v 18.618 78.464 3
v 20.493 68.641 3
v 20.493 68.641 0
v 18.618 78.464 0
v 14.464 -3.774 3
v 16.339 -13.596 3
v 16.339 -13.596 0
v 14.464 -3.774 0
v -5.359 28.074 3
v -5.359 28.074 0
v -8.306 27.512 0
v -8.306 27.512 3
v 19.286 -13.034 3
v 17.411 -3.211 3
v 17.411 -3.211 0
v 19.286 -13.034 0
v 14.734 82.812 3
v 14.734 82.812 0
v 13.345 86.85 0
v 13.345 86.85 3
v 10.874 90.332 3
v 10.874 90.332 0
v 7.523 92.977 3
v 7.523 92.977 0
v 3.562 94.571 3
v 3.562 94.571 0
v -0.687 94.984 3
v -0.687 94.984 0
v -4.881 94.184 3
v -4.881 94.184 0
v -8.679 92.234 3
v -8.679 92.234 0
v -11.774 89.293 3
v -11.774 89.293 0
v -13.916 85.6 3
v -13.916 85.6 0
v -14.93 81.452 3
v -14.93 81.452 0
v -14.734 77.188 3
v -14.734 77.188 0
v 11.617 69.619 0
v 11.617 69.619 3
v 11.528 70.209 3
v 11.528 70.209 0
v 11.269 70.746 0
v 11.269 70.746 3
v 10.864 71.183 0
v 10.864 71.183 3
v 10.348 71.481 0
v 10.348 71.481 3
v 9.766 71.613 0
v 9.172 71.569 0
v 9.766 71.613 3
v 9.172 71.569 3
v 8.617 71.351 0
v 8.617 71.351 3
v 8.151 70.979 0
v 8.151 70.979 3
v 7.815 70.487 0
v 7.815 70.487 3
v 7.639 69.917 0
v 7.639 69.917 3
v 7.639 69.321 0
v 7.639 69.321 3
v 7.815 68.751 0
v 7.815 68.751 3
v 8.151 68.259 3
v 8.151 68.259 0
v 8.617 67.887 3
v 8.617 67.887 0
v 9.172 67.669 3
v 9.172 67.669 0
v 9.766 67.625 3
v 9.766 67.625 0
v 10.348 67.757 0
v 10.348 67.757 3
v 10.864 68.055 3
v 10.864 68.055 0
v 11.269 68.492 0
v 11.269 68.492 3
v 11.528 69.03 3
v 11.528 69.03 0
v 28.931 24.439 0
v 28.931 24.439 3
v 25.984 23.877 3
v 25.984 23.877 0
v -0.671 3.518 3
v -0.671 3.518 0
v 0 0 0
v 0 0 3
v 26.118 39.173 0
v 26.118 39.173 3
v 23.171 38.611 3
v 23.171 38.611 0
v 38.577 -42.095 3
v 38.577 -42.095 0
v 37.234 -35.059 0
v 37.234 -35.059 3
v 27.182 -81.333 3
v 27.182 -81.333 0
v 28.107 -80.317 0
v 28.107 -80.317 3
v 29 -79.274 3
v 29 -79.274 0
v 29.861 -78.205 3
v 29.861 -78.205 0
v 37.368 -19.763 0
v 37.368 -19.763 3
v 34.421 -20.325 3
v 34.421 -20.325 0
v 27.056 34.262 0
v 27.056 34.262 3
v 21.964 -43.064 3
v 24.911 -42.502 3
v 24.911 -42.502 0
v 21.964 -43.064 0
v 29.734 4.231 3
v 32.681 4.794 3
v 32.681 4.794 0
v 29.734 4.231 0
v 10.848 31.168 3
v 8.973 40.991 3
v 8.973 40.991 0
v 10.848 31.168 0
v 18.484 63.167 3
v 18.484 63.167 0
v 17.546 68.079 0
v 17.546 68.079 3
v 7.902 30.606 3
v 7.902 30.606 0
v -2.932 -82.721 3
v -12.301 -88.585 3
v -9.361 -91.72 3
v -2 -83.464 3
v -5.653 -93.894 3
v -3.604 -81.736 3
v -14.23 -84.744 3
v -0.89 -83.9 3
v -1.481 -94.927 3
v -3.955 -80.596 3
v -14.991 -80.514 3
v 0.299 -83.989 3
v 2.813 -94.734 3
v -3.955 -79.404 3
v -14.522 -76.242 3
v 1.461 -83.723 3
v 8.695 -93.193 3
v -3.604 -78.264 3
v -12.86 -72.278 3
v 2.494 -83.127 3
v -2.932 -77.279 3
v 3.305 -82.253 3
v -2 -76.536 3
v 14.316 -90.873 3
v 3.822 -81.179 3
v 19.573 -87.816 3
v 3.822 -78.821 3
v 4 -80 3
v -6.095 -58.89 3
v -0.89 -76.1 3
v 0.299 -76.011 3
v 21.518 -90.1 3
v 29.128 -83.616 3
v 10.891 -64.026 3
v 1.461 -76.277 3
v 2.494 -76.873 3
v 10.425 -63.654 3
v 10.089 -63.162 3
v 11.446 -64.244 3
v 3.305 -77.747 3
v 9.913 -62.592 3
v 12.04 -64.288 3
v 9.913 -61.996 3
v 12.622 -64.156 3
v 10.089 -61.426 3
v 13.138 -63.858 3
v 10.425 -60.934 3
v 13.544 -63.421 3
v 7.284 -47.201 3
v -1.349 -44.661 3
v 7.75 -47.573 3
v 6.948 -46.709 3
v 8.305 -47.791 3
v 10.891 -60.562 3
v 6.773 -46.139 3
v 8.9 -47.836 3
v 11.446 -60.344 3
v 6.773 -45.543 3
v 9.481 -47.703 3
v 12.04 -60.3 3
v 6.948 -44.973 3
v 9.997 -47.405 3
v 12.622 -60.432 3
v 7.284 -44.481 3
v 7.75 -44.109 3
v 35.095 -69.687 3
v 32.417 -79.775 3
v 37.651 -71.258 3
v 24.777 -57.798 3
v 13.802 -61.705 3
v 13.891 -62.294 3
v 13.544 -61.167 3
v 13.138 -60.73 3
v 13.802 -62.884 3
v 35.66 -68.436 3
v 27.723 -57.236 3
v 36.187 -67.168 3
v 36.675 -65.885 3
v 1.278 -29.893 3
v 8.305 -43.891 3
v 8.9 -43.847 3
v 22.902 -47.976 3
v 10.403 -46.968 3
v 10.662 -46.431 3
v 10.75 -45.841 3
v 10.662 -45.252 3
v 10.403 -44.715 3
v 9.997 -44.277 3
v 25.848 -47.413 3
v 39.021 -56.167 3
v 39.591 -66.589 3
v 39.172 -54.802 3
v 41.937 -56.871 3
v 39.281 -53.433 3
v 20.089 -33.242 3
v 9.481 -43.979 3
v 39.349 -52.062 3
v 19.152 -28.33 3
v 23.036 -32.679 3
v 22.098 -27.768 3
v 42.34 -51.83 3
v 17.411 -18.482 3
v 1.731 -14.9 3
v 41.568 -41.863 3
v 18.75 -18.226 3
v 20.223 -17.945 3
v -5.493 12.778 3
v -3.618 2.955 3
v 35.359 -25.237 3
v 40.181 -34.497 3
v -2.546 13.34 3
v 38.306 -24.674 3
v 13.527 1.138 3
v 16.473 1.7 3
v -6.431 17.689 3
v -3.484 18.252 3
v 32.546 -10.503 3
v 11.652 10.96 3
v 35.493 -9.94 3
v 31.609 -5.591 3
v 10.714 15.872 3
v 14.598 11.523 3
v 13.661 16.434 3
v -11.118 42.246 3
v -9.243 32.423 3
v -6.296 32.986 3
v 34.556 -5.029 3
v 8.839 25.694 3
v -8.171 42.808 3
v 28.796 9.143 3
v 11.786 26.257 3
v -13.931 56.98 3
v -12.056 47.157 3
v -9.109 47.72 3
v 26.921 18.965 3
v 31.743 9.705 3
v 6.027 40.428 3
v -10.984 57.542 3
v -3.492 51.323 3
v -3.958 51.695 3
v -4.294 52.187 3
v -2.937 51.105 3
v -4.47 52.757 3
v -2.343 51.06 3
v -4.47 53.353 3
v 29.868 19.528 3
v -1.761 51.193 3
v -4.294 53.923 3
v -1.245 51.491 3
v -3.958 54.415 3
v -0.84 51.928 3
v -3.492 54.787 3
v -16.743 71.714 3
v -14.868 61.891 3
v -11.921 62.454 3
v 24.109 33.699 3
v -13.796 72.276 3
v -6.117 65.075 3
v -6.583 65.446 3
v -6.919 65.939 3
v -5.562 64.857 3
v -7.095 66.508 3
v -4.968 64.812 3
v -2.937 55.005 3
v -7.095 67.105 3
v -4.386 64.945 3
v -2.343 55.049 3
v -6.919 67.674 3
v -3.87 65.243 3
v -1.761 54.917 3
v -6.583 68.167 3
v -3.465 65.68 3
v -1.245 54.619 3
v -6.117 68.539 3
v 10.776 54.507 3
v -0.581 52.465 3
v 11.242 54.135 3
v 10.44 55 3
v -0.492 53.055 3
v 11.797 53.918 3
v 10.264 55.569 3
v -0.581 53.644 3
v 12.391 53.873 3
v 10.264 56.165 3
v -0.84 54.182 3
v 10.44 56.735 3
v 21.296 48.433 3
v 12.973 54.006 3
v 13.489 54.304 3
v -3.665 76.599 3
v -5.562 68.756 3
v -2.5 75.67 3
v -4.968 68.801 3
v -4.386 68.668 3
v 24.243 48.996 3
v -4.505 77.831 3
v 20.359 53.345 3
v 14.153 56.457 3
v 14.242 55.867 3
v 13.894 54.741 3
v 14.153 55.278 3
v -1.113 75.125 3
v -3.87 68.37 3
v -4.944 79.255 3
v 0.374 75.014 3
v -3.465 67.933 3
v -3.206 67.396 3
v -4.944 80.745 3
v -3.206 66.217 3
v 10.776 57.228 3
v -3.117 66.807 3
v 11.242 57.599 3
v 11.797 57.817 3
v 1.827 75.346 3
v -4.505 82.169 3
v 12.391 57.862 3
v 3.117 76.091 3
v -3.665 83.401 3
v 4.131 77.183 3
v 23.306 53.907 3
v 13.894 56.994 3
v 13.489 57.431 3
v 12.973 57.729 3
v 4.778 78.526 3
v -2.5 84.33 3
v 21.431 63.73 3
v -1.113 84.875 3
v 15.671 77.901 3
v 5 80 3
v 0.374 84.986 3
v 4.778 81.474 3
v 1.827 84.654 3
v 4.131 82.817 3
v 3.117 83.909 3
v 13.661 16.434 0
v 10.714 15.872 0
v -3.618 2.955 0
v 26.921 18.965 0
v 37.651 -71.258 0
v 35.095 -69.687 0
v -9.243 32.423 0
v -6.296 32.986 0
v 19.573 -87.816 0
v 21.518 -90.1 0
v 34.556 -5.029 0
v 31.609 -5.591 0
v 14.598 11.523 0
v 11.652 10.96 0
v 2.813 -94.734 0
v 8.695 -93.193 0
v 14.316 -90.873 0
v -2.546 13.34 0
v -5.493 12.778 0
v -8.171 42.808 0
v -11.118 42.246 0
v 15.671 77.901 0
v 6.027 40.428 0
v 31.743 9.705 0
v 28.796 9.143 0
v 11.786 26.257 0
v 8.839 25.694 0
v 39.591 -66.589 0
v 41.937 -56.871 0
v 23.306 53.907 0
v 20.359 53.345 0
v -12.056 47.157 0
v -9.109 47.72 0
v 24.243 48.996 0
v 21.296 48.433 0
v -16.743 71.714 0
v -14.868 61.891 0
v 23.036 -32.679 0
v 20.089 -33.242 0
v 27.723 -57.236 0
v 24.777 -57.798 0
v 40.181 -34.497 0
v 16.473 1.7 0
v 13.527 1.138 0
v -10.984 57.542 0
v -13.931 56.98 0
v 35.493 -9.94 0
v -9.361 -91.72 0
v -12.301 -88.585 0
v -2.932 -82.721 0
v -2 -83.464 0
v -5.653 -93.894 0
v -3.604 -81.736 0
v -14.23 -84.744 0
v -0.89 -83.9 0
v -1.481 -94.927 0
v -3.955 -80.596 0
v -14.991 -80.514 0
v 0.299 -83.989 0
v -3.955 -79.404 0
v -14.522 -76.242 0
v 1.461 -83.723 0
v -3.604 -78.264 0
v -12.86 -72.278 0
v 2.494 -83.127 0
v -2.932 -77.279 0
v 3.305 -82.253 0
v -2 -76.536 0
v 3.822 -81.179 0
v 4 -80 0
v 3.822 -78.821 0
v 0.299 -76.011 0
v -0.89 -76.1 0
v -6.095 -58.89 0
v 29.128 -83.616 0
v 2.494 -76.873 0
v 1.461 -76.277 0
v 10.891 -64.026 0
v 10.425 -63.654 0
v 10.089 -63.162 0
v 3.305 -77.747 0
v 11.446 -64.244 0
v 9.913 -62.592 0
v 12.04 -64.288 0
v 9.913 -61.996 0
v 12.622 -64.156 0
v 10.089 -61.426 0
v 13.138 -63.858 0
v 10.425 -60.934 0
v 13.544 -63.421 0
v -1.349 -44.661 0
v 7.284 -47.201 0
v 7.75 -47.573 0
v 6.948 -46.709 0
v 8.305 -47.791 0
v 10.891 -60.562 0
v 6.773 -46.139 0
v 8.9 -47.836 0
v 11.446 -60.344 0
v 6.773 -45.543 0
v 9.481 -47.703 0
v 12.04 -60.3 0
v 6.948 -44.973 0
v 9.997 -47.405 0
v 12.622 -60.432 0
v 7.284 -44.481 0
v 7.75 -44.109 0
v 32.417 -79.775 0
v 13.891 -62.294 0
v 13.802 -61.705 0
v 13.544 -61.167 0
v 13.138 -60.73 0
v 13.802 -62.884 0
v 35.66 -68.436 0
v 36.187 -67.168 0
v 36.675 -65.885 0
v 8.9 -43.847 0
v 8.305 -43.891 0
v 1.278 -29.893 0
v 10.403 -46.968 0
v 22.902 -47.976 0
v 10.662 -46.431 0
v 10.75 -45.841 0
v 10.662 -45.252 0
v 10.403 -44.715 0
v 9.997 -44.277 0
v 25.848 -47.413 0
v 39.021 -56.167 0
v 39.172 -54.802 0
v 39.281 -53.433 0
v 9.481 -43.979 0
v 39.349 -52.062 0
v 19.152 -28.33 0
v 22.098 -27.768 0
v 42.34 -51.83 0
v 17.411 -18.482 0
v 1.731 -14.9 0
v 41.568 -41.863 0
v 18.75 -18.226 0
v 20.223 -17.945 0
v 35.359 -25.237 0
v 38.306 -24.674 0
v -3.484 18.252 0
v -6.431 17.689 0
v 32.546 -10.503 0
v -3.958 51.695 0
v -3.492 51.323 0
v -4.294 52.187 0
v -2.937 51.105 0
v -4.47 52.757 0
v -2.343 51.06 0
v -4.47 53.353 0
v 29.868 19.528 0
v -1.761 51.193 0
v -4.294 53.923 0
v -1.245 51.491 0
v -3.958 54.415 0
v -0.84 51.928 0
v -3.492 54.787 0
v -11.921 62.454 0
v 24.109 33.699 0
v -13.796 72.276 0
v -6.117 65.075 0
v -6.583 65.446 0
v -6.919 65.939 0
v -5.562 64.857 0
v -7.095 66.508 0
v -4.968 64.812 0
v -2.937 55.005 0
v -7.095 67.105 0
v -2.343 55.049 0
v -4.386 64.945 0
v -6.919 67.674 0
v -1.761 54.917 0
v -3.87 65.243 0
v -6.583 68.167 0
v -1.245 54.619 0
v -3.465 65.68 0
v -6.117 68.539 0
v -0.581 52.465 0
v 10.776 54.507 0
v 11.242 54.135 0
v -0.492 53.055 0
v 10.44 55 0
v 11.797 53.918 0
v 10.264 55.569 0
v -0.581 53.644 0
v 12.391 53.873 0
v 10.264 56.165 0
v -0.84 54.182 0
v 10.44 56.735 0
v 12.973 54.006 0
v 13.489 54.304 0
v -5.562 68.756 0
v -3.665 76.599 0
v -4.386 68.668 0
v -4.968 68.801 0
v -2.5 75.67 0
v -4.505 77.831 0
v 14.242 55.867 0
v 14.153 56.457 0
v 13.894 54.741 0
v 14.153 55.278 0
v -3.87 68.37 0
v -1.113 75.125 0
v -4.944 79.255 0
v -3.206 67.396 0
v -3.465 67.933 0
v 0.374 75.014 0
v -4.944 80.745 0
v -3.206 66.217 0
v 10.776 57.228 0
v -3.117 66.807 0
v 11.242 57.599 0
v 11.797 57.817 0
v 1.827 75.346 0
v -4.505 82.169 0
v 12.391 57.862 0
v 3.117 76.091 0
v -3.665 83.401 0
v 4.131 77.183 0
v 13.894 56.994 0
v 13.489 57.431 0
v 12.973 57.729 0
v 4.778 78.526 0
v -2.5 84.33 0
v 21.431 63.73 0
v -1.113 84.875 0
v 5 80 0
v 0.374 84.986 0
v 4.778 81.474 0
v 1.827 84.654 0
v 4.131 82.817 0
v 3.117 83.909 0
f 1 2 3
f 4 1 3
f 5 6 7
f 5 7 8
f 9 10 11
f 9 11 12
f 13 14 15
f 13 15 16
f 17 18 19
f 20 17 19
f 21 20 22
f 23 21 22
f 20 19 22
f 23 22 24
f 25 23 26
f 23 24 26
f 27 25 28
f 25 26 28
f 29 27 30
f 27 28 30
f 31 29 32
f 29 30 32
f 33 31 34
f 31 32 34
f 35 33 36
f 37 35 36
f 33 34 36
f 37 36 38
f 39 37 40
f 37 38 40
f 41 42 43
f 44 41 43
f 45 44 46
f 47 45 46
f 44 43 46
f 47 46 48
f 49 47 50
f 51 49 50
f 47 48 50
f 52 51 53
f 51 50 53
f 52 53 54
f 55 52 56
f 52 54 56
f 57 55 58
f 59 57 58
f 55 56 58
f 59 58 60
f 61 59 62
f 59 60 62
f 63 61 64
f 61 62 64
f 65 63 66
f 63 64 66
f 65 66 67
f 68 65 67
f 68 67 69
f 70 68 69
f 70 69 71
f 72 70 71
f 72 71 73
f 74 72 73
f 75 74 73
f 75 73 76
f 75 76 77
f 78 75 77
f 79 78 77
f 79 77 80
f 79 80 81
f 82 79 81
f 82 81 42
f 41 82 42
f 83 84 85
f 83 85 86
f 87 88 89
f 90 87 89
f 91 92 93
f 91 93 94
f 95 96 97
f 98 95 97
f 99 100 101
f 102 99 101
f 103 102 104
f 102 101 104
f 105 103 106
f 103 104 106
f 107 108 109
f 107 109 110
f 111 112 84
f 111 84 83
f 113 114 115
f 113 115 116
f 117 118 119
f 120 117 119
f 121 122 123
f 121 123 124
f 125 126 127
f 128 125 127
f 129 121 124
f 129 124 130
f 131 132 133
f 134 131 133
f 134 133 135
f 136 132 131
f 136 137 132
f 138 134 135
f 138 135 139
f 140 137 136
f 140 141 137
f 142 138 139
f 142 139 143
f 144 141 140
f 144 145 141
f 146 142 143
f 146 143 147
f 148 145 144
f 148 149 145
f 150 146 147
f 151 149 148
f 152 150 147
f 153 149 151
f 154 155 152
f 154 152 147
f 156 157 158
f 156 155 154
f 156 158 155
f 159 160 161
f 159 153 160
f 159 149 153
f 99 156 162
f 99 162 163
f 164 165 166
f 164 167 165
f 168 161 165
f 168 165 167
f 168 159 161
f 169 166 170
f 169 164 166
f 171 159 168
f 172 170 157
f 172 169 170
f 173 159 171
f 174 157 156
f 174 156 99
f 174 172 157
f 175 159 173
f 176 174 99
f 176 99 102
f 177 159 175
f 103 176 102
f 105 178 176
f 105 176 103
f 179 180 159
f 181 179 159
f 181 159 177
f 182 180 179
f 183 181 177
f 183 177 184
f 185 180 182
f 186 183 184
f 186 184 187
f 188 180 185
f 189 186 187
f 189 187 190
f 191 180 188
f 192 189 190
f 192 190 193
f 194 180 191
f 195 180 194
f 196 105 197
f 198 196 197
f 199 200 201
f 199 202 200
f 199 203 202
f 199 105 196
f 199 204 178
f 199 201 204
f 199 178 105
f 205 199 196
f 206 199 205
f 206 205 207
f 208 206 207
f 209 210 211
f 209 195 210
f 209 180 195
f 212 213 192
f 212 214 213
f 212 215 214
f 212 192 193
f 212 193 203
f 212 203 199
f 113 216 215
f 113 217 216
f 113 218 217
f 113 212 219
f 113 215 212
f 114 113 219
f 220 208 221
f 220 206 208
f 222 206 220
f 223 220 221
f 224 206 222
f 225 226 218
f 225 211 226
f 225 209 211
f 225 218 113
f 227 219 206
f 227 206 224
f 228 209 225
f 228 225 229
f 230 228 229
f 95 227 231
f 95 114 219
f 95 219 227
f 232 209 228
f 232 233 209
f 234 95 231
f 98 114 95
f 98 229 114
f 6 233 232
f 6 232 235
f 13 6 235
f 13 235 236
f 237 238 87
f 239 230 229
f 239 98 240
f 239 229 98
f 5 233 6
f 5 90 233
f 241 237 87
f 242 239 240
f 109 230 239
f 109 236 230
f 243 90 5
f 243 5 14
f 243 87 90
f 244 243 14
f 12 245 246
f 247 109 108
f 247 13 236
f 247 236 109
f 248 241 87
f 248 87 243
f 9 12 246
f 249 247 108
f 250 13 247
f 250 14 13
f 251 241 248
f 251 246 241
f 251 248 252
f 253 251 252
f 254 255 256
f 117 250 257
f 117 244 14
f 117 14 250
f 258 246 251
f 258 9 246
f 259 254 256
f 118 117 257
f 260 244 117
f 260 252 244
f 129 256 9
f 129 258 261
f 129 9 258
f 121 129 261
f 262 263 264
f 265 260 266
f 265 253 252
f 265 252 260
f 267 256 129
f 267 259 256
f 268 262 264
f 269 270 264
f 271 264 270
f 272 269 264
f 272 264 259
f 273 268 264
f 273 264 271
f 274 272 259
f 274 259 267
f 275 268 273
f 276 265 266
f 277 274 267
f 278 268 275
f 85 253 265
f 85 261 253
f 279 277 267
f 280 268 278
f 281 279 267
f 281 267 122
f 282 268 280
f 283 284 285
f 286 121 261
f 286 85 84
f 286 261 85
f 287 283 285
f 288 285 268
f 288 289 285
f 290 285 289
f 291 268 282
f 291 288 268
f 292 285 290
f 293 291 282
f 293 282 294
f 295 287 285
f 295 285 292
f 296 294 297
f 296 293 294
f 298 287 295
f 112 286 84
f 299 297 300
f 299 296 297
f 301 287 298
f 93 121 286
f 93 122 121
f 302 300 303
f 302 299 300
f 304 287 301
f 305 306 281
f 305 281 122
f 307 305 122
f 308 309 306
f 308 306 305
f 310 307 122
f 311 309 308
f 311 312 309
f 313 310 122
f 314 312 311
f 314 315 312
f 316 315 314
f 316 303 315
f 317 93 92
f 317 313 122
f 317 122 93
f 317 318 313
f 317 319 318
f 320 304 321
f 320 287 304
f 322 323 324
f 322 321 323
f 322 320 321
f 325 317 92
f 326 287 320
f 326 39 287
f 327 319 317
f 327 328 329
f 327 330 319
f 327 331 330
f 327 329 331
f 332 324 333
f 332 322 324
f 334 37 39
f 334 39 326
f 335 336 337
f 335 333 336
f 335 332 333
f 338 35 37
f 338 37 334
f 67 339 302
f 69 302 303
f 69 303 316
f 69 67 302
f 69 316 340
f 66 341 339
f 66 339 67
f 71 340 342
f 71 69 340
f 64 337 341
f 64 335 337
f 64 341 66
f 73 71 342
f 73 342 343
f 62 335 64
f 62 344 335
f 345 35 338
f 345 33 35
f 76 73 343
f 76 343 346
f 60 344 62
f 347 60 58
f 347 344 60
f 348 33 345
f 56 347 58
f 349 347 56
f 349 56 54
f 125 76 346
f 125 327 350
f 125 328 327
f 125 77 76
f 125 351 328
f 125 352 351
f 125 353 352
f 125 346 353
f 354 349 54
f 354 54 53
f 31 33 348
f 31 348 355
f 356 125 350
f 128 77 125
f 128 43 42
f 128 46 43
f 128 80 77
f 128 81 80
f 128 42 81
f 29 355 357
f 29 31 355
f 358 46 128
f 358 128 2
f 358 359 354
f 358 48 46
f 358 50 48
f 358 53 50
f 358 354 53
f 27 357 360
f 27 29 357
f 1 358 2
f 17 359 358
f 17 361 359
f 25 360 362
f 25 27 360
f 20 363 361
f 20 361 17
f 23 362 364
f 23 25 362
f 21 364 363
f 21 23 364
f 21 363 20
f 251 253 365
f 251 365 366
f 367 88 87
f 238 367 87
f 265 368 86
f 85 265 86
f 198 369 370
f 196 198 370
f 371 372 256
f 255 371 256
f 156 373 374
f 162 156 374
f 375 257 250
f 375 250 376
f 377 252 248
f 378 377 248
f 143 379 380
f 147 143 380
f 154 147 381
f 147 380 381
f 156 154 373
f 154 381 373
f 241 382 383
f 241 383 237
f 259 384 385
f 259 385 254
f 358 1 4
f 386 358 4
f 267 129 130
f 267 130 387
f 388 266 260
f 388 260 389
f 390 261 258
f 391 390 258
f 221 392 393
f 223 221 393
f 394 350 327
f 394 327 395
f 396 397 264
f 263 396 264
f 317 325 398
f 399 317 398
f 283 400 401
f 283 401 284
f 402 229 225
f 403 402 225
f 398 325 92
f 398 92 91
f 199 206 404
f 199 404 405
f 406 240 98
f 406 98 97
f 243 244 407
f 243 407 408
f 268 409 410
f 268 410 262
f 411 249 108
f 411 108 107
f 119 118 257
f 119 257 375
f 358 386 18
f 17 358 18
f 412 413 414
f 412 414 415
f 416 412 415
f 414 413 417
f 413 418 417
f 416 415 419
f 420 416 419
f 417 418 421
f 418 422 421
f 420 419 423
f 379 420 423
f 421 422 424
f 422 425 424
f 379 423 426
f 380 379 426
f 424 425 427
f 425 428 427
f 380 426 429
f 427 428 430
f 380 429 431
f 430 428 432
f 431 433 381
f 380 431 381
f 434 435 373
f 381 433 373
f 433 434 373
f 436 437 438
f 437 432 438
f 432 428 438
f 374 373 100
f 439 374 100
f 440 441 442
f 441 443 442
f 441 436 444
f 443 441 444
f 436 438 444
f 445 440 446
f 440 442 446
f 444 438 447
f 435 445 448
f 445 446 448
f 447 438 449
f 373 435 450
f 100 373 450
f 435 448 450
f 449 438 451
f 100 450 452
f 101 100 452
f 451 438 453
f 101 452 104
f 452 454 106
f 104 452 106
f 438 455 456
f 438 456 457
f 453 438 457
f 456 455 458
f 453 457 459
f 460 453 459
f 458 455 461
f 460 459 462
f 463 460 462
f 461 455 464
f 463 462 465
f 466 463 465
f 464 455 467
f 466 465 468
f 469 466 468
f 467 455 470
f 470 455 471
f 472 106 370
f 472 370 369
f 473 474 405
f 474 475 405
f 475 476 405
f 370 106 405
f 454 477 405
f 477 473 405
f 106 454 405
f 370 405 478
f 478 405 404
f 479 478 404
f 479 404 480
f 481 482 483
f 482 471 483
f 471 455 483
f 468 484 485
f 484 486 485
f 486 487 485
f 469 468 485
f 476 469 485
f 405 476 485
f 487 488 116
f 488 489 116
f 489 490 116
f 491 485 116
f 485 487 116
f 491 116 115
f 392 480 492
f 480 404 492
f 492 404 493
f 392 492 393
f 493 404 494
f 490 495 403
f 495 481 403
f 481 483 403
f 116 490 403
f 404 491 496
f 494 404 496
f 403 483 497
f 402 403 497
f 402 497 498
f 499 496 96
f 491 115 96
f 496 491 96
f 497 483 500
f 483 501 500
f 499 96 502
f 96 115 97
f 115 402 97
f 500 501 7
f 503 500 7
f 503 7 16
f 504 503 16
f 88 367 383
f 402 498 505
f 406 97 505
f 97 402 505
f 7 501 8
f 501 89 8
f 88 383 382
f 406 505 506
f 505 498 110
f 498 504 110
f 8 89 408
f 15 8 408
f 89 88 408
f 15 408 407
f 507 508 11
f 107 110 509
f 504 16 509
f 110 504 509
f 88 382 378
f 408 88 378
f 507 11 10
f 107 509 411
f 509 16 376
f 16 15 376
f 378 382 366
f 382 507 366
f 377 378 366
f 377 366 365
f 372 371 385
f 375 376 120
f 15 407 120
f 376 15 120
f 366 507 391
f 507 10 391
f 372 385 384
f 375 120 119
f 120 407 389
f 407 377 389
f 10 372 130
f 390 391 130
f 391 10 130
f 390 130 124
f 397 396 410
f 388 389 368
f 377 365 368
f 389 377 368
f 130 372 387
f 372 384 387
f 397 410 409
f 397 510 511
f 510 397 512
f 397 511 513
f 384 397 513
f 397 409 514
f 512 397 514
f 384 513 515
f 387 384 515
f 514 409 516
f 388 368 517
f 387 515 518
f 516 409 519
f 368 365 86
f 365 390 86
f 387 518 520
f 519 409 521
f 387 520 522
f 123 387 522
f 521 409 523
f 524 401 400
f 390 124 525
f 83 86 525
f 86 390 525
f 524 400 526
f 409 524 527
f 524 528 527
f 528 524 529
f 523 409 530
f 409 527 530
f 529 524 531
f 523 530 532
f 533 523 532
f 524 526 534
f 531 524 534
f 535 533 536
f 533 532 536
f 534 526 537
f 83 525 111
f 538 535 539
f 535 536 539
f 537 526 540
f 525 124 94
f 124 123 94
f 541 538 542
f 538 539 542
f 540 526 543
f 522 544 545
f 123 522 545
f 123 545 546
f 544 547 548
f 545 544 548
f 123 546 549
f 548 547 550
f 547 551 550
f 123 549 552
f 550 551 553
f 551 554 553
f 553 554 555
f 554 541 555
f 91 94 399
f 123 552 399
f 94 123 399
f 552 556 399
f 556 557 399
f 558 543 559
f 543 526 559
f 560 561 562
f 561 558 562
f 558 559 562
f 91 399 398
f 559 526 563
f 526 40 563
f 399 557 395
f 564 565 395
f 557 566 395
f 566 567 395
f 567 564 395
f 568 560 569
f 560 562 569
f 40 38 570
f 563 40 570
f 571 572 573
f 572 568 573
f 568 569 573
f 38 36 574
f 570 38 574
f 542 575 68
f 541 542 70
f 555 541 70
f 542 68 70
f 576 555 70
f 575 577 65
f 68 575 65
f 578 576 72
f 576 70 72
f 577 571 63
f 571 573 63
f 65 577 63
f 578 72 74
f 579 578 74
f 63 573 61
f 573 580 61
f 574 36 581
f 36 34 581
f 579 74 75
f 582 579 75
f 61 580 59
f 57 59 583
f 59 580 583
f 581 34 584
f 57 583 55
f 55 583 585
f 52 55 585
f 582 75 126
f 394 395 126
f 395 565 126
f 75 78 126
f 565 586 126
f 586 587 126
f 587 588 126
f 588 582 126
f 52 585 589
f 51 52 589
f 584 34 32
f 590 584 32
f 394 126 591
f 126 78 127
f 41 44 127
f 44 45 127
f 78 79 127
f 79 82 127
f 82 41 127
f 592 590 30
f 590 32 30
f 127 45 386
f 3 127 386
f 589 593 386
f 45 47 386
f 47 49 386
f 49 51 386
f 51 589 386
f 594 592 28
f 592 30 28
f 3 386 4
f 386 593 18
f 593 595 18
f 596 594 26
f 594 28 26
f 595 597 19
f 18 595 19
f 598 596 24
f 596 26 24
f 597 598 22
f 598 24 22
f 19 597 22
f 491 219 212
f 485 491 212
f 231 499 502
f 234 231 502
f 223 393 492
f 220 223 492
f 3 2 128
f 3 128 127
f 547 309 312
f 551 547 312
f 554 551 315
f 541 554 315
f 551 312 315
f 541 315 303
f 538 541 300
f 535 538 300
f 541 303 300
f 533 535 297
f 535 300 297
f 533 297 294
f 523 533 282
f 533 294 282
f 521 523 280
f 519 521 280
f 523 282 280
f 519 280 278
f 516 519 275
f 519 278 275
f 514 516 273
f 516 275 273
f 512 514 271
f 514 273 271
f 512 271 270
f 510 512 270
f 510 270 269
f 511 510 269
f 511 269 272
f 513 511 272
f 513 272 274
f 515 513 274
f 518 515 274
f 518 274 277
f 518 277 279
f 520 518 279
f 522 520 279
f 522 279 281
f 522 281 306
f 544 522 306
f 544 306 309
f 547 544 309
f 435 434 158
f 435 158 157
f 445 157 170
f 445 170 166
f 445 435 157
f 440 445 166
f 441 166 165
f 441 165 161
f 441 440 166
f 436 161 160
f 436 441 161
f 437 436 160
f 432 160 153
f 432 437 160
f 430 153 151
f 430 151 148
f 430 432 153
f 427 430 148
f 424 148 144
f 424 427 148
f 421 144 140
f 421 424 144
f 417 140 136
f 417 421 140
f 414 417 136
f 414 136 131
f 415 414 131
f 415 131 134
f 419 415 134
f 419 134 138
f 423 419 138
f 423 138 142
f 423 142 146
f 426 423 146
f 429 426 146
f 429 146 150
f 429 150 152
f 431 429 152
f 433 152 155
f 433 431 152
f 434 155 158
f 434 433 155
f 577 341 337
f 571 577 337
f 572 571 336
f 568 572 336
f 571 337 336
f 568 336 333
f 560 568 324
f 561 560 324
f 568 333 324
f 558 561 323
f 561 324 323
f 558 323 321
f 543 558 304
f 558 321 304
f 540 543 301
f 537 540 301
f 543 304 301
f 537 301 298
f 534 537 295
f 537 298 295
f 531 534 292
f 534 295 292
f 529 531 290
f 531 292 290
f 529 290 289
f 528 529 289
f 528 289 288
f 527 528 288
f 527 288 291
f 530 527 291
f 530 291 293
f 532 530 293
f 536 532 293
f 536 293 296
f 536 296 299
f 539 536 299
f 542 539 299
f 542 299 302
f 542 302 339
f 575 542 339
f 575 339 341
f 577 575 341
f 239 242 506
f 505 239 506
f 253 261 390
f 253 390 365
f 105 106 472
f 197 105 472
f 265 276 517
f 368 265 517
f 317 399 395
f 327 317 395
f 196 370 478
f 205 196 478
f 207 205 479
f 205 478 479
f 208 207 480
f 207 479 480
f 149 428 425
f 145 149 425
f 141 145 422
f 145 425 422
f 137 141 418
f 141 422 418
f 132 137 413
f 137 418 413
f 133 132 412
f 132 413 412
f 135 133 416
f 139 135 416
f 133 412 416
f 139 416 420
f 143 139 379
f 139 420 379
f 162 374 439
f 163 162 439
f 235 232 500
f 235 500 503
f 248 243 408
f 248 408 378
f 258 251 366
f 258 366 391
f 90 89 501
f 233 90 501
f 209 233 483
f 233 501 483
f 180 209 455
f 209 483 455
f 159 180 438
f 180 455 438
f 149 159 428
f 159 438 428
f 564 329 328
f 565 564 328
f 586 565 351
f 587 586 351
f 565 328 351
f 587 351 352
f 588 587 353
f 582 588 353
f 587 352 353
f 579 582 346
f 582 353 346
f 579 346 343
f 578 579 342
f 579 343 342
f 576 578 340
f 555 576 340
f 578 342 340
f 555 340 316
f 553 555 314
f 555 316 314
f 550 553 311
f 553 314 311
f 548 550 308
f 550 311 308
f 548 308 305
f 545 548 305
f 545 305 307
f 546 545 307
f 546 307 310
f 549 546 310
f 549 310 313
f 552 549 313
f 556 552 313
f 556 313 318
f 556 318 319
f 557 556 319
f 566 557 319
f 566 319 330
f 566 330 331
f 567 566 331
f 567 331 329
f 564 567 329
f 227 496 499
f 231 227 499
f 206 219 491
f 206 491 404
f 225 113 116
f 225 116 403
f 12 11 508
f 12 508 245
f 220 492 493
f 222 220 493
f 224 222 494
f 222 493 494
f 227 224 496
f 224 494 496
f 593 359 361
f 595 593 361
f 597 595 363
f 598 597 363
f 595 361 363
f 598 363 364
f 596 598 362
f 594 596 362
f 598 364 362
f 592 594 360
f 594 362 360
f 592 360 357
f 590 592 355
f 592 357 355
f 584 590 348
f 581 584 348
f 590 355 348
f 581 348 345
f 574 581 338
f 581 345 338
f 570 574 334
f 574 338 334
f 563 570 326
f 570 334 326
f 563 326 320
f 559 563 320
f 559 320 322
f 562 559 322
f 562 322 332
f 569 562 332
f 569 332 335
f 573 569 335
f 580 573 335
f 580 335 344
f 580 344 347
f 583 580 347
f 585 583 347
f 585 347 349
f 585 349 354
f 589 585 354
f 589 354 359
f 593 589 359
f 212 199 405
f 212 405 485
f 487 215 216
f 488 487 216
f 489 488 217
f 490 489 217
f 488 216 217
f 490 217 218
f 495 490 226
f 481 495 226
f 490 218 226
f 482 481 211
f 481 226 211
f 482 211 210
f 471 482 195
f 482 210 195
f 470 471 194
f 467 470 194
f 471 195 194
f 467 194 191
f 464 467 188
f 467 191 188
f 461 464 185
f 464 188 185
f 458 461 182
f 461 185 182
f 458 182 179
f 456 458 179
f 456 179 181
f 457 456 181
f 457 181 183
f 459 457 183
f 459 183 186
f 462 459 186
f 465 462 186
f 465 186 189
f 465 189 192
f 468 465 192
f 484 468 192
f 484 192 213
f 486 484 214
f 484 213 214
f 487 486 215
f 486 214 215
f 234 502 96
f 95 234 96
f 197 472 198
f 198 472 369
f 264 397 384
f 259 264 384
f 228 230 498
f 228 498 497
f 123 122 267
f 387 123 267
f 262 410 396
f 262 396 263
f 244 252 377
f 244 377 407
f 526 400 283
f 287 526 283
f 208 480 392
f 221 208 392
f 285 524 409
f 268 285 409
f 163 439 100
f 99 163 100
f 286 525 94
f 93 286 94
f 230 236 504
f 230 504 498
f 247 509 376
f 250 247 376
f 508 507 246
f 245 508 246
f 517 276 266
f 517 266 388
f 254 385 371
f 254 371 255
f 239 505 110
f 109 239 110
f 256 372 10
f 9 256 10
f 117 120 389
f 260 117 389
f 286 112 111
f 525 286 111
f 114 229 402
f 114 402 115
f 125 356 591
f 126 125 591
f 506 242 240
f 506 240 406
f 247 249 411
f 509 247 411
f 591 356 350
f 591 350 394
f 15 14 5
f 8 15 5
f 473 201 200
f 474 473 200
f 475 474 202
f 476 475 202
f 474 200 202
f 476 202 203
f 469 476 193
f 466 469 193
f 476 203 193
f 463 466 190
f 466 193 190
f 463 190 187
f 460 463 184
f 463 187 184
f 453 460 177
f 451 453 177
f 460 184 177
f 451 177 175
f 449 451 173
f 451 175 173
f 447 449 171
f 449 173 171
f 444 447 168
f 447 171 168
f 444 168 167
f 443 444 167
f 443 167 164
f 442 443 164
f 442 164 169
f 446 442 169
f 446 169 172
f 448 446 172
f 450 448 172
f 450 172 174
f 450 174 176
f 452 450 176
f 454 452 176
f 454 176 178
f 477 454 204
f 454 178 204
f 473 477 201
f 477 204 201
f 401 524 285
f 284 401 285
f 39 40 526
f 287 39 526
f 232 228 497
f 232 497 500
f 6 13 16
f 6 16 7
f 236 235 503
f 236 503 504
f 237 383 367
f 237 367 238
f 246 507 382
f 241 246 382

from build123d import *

# Parameters (mm, degrees)
SKETCH_1_R          = 4
EXTRUDE_1_DEPTH     = 3
SKETCH_3_W          = 3
SKETCH_3_H          = 10
EXTRUDE_2_DEPTH     = 3
EXTRUDE_START       = -3
EXTRUDE_3_DEPTH     = 3
SKETCH_6_W          = 3
SKETCH_6_H          = 10
EXTRUDE_4_DEPTH     = 3
SKETCH_9_R          = 2
CUT_EXTRUDE_1_DEPTH = 3
CUT_EXTRUDE_2_DEPTH = 3
SKETCH_11_R         = 2
CUT_EXTRUDE_3_DEPTH = 10
SKETCH_12_R         = 5
CUT_EXTRUDE_4_DEPTH = 10


with BuildPart() as part:
    # 草图1 → 凸台-拉伸1 (new body)
    with BuildSketch(Plane.XY):
        with BuildLine():
            Line((-14.733969043, 77.1875), (0, 0))
            ThreePointArc((0, 0), (0.234014868, -37.324654706), (-12.859683228, -72.278047703))
            ThreePointArc((-12.859683228, -72.278047703), (-12.300551756, -88.584662282), (2.8125, -94.733969043))
            ThreePointArc((2.8125, -94.733969043), (31.596681738, -75.82131672), (38.576907128, -42.094561915))
            Line((38.576907128, -42.094561915), (14.733969043, 82.8125))
            ThreePointArc((14.733969043, 82.8125), (-2.8125, 94.733969043), (-14.733969043, 77.1875))
        make_face()
        with Locations((0, 80)):
            Circle(SKETCH_1_R, mode=Mode.SUBTRACT)
        with Locations((0, -80)):
            Circle(SKETCH_1_R, mode=Mode.SUBTRACT)
    extrude(amount=EXTRUDE_1_DEPTH)

    # 草图3 → 凸台-拉伸2 (add)
    with BuildSketch(Plane(origin=(29.467938085, 5.625, 0), x_dir=(0, 0, -1), z_dir=(0.9822646028438571, 0.18749999999999992, 0))):
        with Locations((-1.5, 68.581168228)):
            Rectangle(SKETCH_3_W, SKETCH_3_H)
        with Locations((-1.5, 53.581168228)):
            Rectangle(SKETCH_3_W, SKETCH_3_H)
        with Locations((-1.5, 38.581168228)):
            Rectangle(SKETCH_3_W, SKETCH_3_H)
        with Locations((-1.5, 23.581168228)):
            Rectangle(SKETCH_3_W, SKETCH_3_H)
        with Locations((-1.5, 8.581168228)):
            Rectangle(SKETCH_3_W, SKETCH_3_H)
        with Locations((-1.5, -6.418831772)):
            Rectangle(SKETCH_3_W, SKETCH_3_H)
        with Locations((-1.5, -21.418831772)):
            Rectangle(SKETCH_3_W, SKETCH_3_H)
        with Locations((-1.5, -36.418831772)):
            Rectangle(SKETCH_3_W, SKETCH_3_H)
    extrude(amount=EXTRUDE_2_DEPTH)

    # 草图5 → 凸台-拉伸3 (add)
    with BuildSketch(Plane.XY.offset(3).offset(EXTRUDE_START)):
        with BuildLine():
            Line((41.937087865, -56.870590681), (39.020842697, -56.166663045))
            ThreePointArc((39.020842697, -56.166663045), (38.118677527, -61.090976463), (36.675111125, -65.884605639))
            Line((36.675111125, -65.884605639), (39.591356294, -66.588533275))
            Line((39.591356294, -66.588533275), (41.937087865, -56.870590681))
        make_face()
        with BuildLine():
            ThreePointArc((36.675111125, -65.884605639), (38.118677527, -61.090976463), (39.020842697, -56.166663045))
            Line((39.020842697, -56.166663045), (31.045751878, -56.518626863))
            Line((31.045751878, -56.518626863), (36.675111125, -65.884605639))
        make_face()
        with BuildLine():
            Line((35.852417991, -52.061745464), (39.348993243, -52.061745464))
            ThreePointArc((39.348993243, -52.061745464), (39.240593596, -47.056646648), (38.576907128, -42.094561915))
            Line((38.576907128, -42.094561915), (35.852417991, -52.061745464))
        make_face()
        with BuildLine():
            ThreePointArc((38.576907128, -42.094561915), (39.240593596, -47.056646648), (39.348993243, -52.061745464))
            Line((39.348993243, -52.061745464), (42.340032816, -51.830051112))
            Line((42.340032816, -51.830051112), (41.567946701, -41.862867564))
            Line((41.567946701, -41.862867564), (38.576907128, -42.094561915))
        make_face()
        with BuildLine():
            ThreePointArc((29.860599408, -78.204651867), (32.714825521, -74.091726153), (35.094532117, -69.687210158))
            Line((35.094532117, -69.687210158), (30.758010447, -62.472220292))
            Line((30.758010447, -62.472220292), (29.860599408, -78.204651867))
        make_face()
        with BuildLine():
            Line((37.650520485, -71.25785444), (35.094532117, -69.687210158))
            ThreePointArc((35.094532117, -69.687210158), (32.714825521, -74.091726153), (29.860599408, -78.204651867))
            Line((29.860599408, -78.204651867), (32.416587776, -79.775296149))
            Line((32.416587776, -79.775296149), (37.650520485, -71.25785444))
        make_face()
        with BuildLine():
            ThreePointArc((19.572509978, -87.815912184), (23.558004264, -84.786291758), (27.182310023, -81.332717899))
            Line((27.182310023, -81.332717899), (19.572509978, -65.497664614))
            Line((19.572509978, -65.497664614), (19.572509978, -87.815912184))
        make_face()
        with BuildLine():
            Line((29.127843641, -83.616333222), (27.182310023, -81.332717899))
            ThreePointArc((27.182310023, -81.332717899), (23.558004264, -84.786291758), (19.572509978, -87.815912184))
            Line((19.572509978, -87.815912184), (21.518043596, -90.099527507))
            Line((21.518043596, -90.099527507), (29.127843641, -83.616333222))
        make_face()
    extrude(amount=EXTRUDE_3_DEPTH)

    # 草图6 → 凸台-拉伸4 (add)
    with BuildSketch(Plane(origin=(0, 0, 0), x_dir=(0, 0, 1), z_dir=(-0.9822646028438571, -0.18749999999999994, 0))):
        with Locations((1.5, 68.581168228)):
            Rectangle(SKETCH_6_W, SKETCH_6_H)
        with Locations((1.5, 53.581168228)):
            Rectangle(SKETCH_6_W, SKETCH_6_H)
        with Locations((1.5, 38.581168228)):
            Rectangle(SKETCH_6_W, SKETCH_6_H)
        with Locations((1.5, 23.581168228)):
            Rectangle(SKETCH_6_W, SKETCH_6_H)
        with Locations((1.5, 8.581168228)):
            Rectangle(SKETCH_6_W, SKETCH_6_H)
    extrude(amount=EXTRUDE_4_DEPTH)

    # 草图9 → 切除-拉伸1 (cut)
    with BuildSketch(Plane.XY.offset(3)):
        with Locations((11.891030957, -62.294073604)):
            Circle(SKETCH_9_R)
        with Locations((8.750405957, -45.841141506)):
            Circle(SKETCH_9_R)
    extrude(amount=-CUT_EXTRUDE_1_DEPTH, mode=Mode.SUBTRACT)

    # 草图10 → 切除-拉伸2 (cut)
    with BuildSketch(Plane.XY.offset(3)):
        Polygon((7.5, 40.709415886), (8.973396904, 40.990665886), (10.848396904, 31.168019858), (7.901603096, 30.605519858), (6.026603096, 40.428165886), align=None)
        Polygon((10.3125, 25.975446844), (11.785896904, 26.256696844), (13.660896904, 16.434050815), (10.714103096, 15.871550815), (8.839103096, 25.694196844), align=None)
        Polygon((13.125, 11.241477801), (14.598396904, 11.522727801), (16.473396904, 1.700081772), (13.526603096, 1.137581772), (11.651603096, 10.960227801), align=None)
        Polygon((15.9375, -3.492491242), (17.410896904, -3.211241242), (19.285896904, -13.03388727), (16.339103096, -13.59638727), (14.464103096, -3.773741242), align=None)
        Polygon((18.75, -18.226460284), (20.223396904, -17.945210284), (22.098396904, -27.767856313), (19.151603096, -28.330356313), (17.410896904, -18.482075553), align=None)
        Polygon((21.5625, -32.960429327), (23.035896904, -32.679179327), (24.910896904, -42.501825355), (21.964103096, -43.064325355), (20.089103096, -33.241679327), align=None)
        Polygon((24.375, -47.69439837), (25.848396904, -47.41314837), (27.723396904, -57.235794398), (24.776603096, -57.798294398), (22.901603096, -47.97564837), align=None)
    extrude(amount=-CUT_EXTRUDE_2_DEPTH, mode=Mode.SUBTRACT)

    # 草图11 → 切除-拉伸3 (cut)
    with BuildSketch(Plane.XY.offset(3)):
        with Locations((9.616984521, 69.619074766)):
            Circle(SKETCH_11_R)
        with Locations((12.241984521, 55.867370326)):
            Circle(SKETCH_11_R)
        with Locations((-5.116984521, 66.806574766)):
            Circle(SKETCH_11_R)
        with Locations((-2.491984521, 53.054870326)):
            Circle(SKETCH_11_R)
    extrude(amount=-CUT_EXTRUDE_3_DEPTH, mode=Mode.SUBTRACT)

    # 草图12 → 切除-拉伸4 (cut)
    with BuildSketch(Plane.XY.offset(3)):
        with Locations((0, 80)):
            Circle(SKETCH_12_R)
    extrude(amount=-CUT_EXTRUDE_4_DEPTH, mode=Mode.SUBTRACT)


solid = part.part
